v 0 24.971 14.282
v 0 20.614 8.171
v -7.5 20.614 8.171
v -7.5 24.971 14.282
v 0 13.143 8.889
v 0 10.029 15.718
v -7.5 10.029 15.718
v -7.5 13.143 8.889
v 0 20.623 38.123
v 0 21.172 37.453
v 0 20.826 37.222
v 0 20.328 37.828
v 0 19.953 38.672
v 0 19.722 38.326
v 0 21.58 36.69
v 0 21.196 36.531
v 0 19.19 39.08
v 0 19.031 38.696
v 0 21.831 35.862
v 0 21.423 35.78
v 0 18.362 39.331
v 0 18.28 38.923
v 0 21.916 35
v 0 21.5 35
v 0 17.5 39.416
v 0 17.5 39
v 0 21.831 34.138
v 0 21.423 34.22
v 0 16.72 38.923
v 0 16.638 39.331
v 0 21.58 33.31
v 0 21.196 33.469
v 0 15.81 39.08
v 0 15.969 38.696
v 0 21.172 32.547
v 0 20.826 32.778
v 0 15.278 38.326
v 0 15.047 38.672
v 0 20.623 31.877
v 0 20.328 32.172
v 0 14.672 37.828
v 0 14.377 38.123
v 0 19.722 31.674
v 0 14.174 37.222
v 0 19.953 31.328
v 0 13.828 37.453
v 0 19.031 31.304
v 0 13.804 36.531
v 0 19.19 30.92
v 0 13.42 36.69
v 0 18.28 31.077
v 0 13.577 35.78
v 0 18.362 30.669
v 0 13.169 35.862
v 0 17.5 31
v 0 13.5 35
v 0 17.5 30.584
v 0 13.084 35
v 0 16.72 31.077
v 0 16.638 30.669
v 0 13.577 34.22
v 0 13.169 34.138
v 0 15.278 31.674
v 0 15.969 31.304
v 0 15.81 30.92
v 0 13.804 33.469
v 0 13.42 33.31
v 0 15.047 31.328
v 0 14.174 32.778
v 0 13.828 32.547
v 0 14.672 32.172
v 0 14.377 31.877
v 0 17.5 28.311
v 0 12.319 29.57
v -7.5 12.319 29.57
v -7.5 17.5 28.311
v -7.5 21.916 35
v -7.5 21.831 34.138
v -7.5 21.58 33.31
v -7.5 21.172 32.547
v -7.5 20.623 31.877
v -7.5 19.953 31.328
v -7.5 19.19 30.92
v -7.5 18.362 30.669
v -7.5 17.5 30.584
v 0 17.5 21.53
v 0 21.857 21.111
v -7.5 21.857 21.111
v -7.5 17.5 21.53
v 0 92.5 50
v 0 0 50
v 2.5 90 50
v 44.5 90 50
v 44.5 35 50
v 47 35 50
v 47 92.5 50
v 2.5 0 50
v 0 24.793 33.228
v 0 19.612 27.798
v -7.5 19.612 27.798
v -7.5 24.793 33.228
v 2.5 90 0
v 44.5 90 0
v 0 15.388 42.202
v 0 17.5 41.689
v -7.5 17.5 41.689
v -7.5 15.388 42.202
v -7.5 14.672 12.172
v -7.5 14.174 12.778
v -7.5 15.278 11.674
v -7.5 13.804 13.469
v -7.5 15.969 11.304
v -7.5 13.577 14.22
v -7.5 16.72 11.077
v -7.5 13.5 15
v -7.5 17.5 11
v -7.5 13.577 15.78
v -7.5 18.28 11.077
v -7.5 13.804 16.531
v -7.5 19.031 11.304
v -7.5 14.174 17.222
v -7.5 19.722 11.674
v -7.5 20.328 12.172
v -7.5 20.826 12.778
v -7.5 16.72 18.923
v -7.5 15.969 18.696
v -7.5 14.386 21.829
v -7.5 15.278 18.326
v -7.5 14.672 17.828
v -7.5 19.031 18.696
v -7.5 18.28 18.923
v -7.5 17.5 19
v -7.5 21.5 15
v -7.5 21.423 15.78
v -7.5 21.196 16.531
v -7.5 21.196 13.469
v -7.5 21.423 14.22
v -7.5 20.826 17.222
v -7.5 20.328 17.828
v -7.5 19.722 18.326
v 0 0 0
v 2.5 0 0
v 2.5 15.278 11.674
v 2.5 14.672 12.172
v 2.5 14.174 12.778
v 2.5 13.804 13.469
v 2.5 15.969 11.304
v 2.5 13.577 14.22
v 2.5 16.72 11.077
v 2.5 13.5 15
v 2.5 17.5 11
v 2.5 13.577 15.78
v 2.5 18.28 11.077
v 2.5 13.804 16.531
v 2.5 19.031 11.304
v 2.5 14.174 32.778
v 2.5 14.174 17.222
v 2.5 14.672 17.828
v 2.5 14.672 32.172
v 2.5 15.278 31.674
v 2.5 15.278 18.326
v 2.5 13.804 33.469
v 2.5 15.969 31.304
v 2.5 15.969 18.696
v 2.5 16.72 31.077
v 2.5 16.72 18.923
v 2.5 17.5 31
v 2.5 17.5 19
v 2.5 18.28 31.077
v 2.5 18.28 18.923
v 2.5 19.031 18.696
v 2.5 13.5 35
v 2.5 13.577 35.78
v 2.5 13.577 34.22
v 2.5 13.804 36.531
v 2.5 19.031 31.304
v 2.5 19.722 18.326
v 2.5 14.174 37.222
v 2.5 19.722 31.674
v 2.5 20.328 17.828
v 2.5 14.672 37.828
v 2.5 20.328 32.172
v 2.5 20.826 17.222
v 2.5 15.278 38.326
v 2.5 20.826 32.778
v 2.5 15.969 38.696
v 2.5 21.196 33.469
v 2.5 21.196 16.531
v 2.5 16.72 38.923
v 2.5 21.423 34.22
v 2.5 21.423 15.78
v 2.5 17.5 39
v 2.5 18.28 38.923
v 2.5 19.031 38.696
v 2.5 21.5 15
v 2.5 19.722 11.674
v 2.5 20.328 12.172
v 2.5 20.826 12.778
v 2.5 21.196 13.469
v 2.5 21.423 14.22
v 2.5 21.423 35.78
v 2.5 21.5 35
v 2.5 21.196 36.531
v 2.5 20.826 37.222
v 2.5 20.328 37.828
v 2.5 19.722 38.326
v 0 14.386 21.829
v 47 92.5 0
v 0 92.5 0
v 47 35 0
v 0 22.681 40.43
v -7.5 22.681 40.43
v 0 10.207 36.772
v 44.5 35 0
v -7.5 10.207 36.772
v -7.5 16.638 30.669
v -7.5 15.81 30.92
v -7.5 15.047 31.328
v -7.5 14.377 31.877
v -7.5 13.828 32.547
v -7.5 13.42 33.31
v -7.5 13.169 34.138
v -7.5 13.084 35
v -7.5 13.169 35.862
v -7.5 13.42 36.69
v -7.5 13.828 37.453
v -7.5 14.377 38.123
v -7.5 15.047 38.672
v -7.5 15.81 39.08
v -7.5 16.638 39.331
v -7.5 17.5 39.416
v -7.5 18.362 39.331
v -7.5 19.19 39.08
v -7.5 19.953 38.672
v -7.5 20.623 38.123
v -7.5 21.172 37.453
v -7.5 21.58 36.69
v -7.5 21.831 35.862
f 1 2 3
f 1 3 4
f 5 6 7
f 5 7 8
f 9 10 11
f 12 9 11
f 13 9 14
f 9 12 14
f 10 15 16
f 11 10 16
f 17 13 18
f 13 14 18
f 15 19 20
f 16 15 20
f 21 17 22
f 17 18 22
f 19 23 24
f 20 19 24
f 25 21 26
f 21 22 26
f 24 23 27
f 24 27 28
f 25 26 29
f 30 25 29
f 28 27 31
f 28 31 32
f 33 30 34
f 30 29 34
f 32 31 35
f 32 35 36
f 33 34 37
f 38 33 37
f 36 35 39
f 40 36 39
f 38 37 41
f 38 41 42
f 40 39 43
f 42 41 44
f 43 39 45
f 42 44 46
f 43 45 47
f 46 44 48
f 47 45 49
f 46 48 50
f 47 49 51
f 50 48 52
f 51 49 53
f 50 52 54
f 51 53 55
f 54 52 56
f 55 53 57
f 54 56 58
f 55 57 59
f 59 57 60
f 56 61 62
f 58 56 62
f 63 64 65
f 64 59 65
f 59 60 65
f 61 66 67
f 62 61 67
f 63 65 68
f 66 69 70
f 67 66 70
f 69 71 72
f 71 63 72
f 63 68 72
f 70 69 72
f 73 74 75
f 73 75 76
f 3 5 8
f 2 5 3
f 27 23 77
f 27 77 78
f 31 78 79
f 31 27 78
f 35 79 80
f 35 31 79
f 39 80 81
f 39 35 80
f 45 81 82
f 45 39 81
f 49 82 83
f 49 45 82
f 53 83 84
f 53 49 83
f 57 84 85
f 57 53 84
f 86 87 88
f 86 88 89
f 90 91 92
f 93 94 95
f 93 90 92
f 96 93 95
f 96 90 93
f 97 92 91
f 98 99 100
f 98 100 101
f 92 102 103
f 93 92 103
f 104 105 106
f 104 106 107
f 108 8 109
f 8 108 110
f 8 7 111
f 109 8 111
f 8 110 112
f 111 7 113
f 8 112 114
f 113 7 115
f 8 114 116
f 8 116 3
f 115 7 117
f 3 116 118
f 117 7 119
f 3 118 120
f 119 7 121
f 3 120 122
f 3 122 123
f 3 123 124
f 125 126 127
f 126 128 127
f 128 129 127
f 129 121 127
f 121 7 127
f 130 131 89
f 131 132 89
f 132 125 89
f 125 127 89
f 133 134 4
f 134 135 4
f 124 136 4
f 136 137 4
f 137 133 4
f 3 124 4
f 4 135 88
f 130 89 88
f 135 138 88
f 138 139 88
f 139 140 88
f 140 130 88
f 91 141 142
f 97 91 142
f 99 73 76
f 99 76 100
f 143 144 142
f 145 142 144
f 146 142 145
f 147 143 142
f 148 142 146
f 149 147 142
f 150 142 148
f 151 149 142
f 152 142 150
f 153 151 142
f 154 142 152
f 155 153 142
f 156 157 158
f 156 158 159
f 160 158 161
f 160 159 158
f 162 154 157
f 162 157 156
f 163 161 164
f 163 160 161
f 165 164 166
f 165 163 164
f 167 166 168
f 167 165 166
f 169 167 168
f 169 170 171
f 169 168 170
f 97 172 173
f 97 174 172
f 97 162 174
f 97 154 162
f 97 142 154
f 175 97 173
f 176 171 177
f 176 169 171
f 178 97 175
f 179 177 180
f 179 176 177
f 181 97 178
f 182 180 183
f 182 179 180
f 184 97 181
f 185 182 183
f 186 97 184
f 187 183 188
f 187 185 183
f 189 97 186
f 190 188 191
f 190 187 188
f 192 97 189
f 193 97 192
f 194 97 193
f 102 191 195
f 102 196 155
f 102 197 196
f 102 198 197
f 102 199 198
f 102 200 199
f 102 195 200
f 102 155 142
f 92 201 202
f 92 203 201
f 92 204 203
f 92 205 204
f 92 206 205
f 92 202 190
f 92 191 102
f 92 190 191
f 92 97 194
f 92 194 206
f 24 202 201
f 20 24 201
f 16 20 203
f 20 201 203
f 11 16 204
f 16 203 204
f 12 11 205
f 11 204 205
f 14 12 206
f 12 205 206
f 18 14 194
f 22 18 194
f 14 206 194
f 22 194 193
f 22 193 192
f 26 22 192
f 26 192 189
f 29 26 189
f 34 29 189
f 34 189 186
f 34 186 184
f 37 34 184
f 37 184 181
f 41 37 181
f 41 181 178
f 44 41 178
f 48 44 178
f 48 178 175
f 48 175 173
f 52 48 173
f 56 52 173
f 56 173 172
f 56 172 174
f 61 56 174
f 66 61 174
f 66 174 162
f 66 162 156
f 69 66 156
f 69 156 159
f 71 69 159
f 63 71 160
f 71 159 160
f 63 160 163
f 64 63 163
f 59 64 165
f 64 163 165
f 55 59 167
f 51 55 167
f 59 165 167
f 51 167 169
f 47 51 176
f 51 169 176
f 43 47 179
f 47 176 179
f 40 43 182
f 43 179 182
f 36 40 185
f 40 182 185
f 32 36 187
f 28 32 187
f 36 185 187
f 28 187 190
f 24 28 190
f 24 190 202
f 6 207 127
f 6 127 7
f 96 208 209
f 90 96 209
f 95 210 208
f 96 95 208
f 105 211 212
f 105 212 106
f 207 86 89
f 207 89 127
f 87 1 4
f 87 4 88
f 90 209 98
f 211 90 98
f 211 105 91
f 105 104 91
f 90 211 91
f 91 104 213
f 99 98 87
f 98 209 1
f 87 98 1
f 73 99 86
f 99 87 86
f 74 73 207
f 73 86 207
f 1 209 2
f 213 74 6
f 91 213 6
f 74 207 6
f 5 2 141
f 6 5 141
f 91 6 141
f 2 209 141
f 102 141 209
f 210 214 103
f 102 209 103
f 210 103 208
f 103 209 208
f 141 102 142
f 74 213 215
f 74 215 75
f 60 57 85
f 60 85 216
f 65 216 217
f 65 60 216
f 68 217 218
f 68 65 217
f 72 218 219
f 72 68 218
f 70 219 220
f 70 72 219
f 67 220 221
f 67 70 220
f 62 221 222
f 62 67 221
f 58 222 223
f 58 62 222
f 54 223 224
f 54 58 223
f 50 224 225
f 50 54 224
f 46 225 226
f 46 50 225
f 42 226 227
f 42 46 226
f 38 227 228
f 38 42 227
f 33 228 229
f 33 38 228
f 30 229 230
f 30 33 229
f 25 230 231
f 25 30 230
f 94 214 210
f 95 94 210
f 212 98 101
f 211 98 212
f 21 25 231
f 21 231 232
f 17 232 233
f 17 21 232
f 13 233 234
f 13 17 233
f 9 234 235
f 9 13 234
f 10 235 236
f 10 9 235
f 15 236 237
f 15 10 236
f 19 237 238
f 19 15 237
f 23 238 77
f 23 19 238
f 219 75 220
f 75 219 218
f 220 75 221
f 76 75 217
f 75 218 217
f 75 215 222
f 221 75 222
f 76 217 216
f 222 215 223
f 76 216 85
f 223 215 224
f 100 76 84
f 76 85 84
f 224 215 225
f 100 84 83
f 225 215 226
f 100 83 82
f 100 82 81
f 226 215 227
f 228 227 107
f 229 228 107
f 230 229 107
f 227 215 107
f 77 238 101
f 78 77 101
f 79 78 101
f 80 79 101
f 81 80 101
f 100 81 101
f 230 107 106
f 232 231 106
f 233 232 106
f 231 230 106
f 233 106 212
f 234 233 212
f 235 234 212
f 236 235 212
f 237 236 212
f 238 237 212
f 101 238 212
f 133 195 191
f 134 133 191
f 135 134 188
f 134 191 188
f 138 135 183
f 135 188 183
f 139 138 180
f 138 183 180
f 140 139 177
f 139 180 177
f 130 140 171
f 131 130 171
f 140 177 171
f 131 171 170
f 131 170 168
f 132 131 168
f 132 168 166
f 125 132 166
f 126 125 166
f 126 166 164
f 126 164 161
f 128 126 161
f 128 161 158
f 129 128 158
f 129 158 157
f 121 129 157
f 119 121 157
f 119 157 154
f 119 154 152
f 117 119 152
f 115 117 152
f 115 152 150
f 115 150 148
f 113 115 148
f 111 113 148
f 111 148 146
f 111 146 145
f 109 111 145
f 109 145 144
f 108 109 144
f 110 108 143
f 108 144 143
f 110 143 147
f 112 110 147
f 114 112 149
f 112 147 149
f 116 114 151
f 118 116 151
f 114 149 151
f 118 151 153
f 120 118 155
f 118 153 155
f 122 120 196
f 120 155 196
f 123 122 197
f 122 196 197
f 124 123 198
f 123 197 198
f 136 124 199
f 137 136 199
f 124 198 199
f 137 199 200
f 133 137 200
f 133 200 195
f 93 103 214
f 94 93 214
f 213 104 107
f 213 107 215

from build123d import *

# Parameters (mm, degrees)
F1_DEPTH = 50
F3_DEPTH = 10
F4_R     = 4
F5_DEPTH = 15


with BuildPart() as f1:
    # F0 (on Top) → F1 (new body)
    with BuildSketch(Plane.XY):
        Polygon((0, 92.5), (0, 0), (2.5, 0), (2.5, 90), (44.5, 90), (44.5, 35), (47, 35), (47, 92.5), align=None)
    extrude(amount=F1_DEPTH)

    # F2 (on face) → F3 (join)
    with BuildSketch(Plane.YZ.offset(2.5)):
        with BuildLine():
            Line((22.68132, 40.430217), (17.5, 41.689106))
            Line((17.5, 41.689106), (17.5, 39.416046))
            ThreePointArc((17.5, 39.416046), (20.622616, 38.122616), (21.916046, 35))
            ThreePointArc((21.916046, 35), (20.622616, 31.877384), (17.5, 30.583954))
            Line((17.5, 30.583954), (17.5, 28.310894))
            Line((17.5, 28.310894), (19.612045, 27.797737))
            Line((19.612045, 27.797737), (24.793366, 33.227953))
            Line((24.793366, 33.227953), (22.68132, 40.430217))
        make_face()
        with BuildLine():
            Line((17.5, 39.416046), (17.5, 41.689106))
            Line((17.5, 41.689106), (15.387955, 42.202263))
            Line((15.387955, 42.202263), (10.206634, 36.772047))
            Line((10.206634, 36.772047), (12.31868, 29.569783))
            Line((12.31868, 29.569783), (17.5, 28.310894))
            Line((17.5, 28.310894), (17.5, 30.583954))
            ThreePointArc((17.5, 30.583954), (13.083954, 35), (17.5, 39.416046))
        make_face()
        with BuildLine():
            ThreePointArc((21.304212, 15), (20.189984, 17.689984), (17.5, 18.804212))
            ThreePointArc((17.5, 18.804212), (14.810016, 12.310016), (21.304212, 15))
        make_face()
        Polygon((21.857131, 21.111362), (17.5, 21.529923), (14.385971, 21.829067), (10.02884, 15.717706), (13.142869, 8.888638), (20.614029, 8.170933), (24.97116, 14.282294), align=None)
        with BuildLine():
            ThreePointArc((21.304212, 15), (14.810016, 12.310016), (17.5, 18.804212))
            ThreePointArc((17.5, 18.804212), (20.189984, 17.689984), (21.304212, 15))
        make_face(mode=Mode.SUBTRACT)
    extrude(amount=-F3_DEPTH)

    # F4 (on face) → F5 (cut)
    with BuildSketch(Plane.YZ.offset(2.5)):
        with Locations((17.5, 35)):
            Circle(F4_R)
        with Locations((17.5, 15)):
            Circle(F4_R)
    extrude(amount=-F5_DEPTH, mode=Mode.SUBTRACT)


solid = f1.part
